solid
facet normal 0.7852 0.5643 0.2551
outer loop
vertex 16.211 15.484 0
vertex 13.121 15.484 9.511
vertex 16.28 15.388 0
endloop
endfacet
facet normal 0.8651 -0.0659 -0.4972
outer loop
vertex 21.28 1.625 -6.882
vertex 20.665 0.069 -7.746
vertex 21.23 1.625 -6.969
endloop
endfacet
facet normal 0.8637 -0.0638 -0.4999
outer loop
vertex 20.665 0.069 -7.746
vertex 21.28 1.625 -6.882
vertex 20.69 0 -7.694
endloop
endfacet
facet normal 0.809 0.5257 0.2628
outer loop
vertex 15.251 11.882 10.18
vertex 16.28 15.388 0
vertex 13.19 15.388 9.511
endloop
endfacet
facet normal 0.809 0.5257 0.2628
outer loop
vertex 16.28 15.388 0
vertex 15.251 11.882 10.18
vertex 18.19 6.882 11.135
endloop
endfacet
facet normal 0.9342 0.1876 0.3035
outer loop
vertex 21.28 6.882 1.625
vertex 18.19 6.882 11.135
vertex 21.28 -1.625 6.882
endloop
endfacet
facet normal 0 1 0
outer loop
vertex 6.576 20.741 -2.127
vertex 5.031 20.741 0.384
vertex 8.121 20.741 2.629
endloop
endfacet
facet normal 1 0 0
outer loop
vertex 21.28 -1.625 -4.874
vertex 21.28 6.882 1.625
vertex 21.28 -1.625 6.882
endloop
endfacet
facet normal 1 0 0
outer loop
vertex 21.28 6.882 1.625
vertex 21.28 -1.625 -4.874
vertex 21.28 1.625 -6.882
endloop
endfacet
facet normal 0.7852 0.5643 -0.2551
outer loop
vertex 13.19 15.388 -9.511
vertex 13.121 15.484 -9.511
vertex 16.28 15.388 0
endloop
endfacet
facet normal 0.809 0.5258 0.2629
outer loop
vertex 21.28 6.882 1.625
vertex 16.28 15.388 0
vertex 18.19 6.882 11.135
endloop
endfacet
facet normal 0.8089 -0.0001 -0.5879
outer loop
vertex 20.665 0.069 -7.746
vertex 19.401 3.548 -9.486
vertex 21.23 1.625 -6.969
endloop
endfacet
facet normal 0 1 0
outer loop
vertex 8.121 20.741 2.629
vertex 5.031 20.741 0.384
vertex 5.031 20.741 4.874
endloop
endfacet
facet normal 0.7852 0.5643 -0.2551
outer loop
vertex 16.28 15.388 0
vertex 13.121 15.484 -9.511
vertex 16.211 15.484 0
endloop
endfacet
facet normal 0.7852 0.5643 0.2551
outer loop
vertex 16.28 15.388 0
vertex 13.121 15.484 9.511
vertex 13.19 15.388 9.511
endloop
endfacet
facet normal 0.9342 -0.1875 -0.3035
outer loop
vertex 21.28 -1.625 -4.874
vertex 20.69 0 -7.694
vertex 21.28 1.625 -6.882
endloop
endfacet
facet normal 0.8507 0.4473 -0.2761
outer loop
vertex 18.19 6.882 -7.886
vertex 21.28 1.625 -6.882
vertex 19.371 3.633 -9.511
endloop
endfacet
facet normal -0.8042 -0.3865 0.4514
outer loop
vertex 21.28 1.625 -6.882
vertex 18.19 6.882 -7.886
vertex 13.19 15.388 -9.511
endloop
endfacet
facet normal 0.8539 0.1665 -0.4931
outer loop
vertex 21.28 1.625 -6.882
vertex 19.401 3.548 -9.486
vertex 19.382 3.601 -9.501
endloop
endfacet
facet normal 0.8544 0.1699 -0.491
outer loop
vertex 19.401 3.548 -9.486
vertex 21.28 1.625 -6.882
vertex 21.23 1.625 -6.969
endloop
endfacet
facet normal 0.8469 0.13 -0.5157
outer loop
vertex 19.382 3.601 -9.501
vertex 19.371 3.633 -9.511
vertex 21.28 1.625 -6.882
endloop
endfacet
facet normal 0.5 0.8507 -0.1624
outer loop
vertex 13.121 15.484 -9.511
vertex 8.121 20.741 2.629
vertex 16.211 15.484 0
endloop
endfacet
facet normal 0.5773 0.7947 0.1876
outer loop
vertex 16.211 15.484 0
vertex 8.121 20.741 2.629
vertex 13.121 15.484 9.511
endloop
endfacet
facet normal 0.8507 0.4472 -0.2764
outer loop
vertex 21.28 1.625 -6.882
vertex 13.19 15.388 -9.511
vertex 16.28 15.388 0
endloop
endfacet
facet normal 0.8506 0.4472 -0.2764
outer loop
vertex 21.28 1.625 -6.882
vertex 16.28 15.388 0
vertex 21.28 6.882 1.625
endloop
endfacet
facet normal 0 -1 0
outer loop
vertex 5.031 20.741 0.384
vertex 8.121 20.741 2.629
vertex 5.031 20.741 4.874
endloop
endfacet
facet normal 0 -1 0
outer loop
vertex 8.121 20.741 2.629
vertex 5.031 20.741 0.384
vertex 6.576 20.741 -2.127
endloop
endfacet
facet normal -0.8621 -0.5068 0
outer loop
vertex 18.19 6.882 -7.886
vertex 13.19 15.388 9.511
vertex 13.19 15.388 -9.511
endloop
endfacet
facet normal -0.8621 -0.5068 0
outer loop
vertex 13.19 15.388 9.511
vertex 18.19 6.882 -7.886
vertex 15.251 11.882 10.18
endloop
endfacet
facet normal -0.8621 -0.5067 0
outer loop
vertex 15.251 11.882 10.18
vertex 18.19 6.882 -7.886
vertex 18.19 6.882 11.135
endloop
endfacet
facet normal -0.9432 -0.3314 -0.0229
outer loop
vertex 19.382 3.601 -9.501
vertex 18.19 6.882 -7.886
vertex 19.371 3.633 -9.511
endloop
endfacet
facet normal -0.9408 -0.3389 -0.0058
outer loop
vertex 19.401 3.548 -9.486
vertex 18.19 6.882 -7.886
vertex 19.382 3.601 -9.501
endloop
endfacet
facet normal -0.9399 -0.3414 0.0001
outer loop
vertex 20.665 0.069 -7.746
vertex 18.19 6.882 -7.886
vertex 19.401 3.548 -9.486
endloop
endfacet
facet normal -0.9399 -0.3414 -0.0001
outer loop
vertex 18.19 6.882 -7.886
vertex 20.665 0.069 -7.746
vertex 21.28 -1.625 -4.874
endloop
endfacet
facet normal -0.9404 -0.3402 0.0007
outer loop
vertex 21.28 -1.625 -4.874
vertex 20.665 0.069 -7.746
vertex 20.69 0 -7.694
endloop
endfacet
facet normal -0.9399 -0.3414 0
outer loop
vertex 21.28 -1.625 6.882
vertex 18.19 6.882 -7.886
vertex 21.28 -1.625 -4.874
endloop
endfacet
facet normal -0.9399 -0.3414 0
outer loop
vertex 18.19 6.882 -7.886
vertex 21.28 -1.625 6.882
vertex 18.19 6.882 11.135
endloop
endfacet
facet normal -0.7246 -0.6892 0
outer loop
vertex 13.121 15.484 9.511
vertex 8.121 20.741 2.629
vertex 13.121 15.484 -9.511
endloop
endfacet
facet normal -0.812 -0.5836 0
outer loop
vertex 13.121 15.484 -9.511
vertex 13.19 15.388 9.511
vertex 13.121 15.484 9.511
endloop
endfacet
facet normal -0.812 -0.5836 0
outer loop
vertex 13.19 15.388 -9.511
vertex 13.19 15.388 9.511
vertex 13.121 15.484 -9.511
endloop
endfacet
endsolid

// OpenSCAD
// Auto-generated OpenSCAD file

    inner_points = 10*[[1.30901696039044, -1.5388417782265715, 0.9510565474746461], [-2.1180339733846583, 0.6881910044632044, -0.16245986108672694], [1.8090169796137625, -0.6881909777335578, 1.1135163775781873], [-1.6180339541613356, 1.5388418049562185, -3.0983185683730596e-08], [1.6180339541612156, -1.538841804956286, 3.0983185683730596e-08], [-1.8090169796138824, 0.68819097773349, -1.1135163775781873], [2.1180339733845384, -0.6881910044632721, 0.16245986108672694], [-1.30901696039056, 1.538841778226504, -0.9510565474746461], [-0.5000000141570125, -0.6881909060497494, 2.064572895340174], [-1.3090169968820657, -0.16245978121444532, 1.801707328858261], [5.066310430925828e-09, 0.1624598944432645, 2.227032725443715], [-0.8090169776587427, 0.6881910192785686, 1.9641671589618024], [0.809016977658623, -0.6881910192786364, -1.9641671589618024], [-5.066430170716978e-09, -0.16245989444333217, -2.227032725443715], [1.3090169968819458, 0.16245978121437765, -1.801707328858261], [0.5000000141568928, 0.6881909060496817, -2.064572895340174], [-1.618034023338573, -1.5388417322190338, 3.303893986172923e-08], [0.5000000468426242, 2.0645728837839843, 0.6881909169706076], [-1.3090170295677974, -1.538841758948748, -0.9510564834525206], [0.8090170406134, 2.06457285705427, -0.26286559952085276], [-2.118033992838755, -0.16245981482511987, -0.6881909555105802], [-0.8090169481364942, 2.064572893422896, -0.26286559849297564], [0.49999998584298705, -0.6881909285267964, 2.0645728947049107], [-1.6180339724070885, 0.6881910252357436, 1.376381907183268], [1.6180339724069686, -0.6881910252358113, -1.376381907183268], [-0.49999998584310684, 0.6881909285267287, -2.0645728947049107], [-1.3090170283594544, -1.5388417193808985, 0.9510565491377863], [0.5000000355661287, 1.5388417893601316, 1.5388417362589322], [-0.5000000355662484, -1.538841789360199, -1.5388417362589322], [1.3090170283593345, 1.538841719380831, -0.9510565491377863], [0.4999999663888912, -1.5388417478151206, 1.5388418002810578], [-2.118033984661154, 0.16245991003935126, 0.6881909582015976], [1.3090169918678283, -0.16245984006011832, 1.8017073271951207], [-1.309016959182217, 1.5388418177943537, 0.9510564851156607], [1.309016959182097, -1.5388418177944212, -0.9510564851156607], [-1.3090169918679482, 0.16245984006005065, -1.8017073271951207], [2.118033984661034, -0.16245991003941893, -0.6881909582015976], [-0.499999966389011, 1.5388417478150531, -1.5388418002810578], [-0.5000000336111086, -1.5388417253380735, 1.5388418009163205], [-1.8090170091361313, -0.6881908964108379, 1.1135163798765904], [0.8090170110911518, 0.6881909829099426, 1.9641671579339253], [-0.49999996443387096, 1.5388418118371785, 1.5388417368941951], [0.49999996443375117, -1.538841811837246, -1.5388417368941951], [-0.8090170110912714, -0.6881909829100104, -1.9641671579339253], [1.8090170091360114, 0.6881908964107701, -1.1135163798765904], [0.5000000336109889, 1.538841725338006, -1.5388418009163205], [-2.1180340041152497, -0.688190909248973, 0.16245986377774424], [-0.49999995315737555, 2.064572906261031, 0.6881909176058706], [-1.6180340050928197, -0.6881909524985592, -1.3763819051275137], [4.586505433710224e-08, 2.064572863011445, -0.8506508512993872]];

    outer_points = 10*[[-0.8090170110916863, -0.6881908812857832, 1.9641671935400922], [1.3090170295679837, 1.538841709741917, -0.95105656307045], [-0.5000000355665741, -1.538841709741917, 1.5388418158770538], [1.6180340050930957, 0.6881908812857832, -1.3763819407334883], [-1.6180340050930957, -0.6881908812857832, 1.3763819407334883], [0.5000000355665741, 1.538841709741917, -1.5388418158770538], [-1.3090170295679837, -1.538841709741917, 0.95105656307045], [0.8090170110916863, 0.6881908812857832, -1.9641671935400922], [1.3090169968815815, 0.1624598744330541, 1.8017073204530507], [1.809017009135817, 0.6881909540230795, 1.113516344270661], [1.6180339724066932, -0.6881909540230795, 1.3763819427900126], [2.118033984660929, -0.1624598744330541, 0.6881909666076228], [-2.118033984660929, 0.1624598744330541, -0.6881909666076228], [-1.6180339724066932, 0.6881909540230795, -1.3763819427900126], [-1.809017009135817, -0.6881909540230795, -1.113516344270661], [-1.3090169968815815, -0.1624598744330541, -1.8017073204530507], [4.5864941067286225e-08, 2.06457290702336, 0.8506507444803071], [1.309016960390704, -1.5388418274333344, -0.9510564678560931], [-0.8090169481364684, 2.06457290702336, 0.26286549167370316], [0.4999999663892946, -1.5388418274333344, -1.538841720662697], [0.5000000468428755, 2.064572848177651, -0.6881910237895683], [1.3090169918683128, -0.16245993327876307, -1.8017073187892874], [0.8090169776582082, -0.6881909176544313, 1.9641671945683543], [2.118034004115161, 0.6881909176544313, 0.1624598281718883], [-2.118034004115161, -0.6881909176544313, -0.1624598281718883], [-0.8090169776582082, 0.6881909176544313, -1.9641671945683543], [0.5000000336107052, 1.5388418049562738, 1.538841721298198], [1.6180339541612545, -1.5388418049562738, 4.863544078581583e-08], [-1.6180339541612545, 1.5388418049562738, -4.863544078581583e-08], [-0.5000000336107052, -1.5388418049562738, -1.538841721298198], [-5.066900010675113e-09, -0.16245977921869703, 2.227032733849236], [1.6180340233385344, 1.5388417322189776, -4.657891639059386e-08], [0.4999999644334254, -1.5388417322189776, 1.538841816512555], [2.1180339928388596, 0.16245977921869703, -0.6881909639155974], [-2.1180339928388596, -0.16245977921869703, 0.6881909639155974], [-0.4999999644334254, 1.5388417322189776, -1.538841816512555], [-1.6180340233385344, -1.5388417322189776, 4.657891639059386e-08], [5.066900010675113e-09, 0.16245977921869703, -2.227032733849236], [0.5000000141564732, 0.6881910128687885, 2.0645728597339326], [1.3090170283591904, 1.5388417685876257, 0.9510564695198562], [1.3090169591819105, -1.5388417685876257, 0.9510565647342133], [2.1180339733846276, -0.6881910128687885, -0.16245982547986293], [-2.1180339733846276, 0.6881910128687885, 0.16245982547986293], [-1.3090169591819105, 1.5388417685876257, -0.9510565647342133], [-1.3090170283591904, -1.5388417685876257, -0.9510564695198562], [-0.5000000141564732, -0.6881910128687885, -2.0645728597339326], [0.8090170406134262, 2.064572870654712, 0.26286549270196535], [1.8090169796140771, -0.6881910353458492, -1.1135163419713967], [-0.4999999531571243, 2.064572870654712, -0.6881910244250694], [0.4999999858435267, -0.6881910353458492, -2.0645728590984316]];

    // Convex hull for inner set (I)
    module inner_hull() {
        hull() {
            for (p = inner_points) {
                translate(p) sphere(r=0.1);
            }
        }
    }

    // Convex hull for outer set (O) minus inner hull (O \ I)
    module outer_minus_inner() {
        difference() {
            hull() {
                for (p = outer_points) {
                    translate(p) sphere(r=0.1);
                }
            }
            inner_hull(); // Subtract inner hull
        }
    }

    // Convex hull for outer set (O) minus all translated inner hulls
    module outer_minus_AllTranslationInner() {
        difference() {
            hull() {
                for (p = outer_points) {
                    translate(p) sphere(r=0.1);
                }
            }
            hull() {
                translate([0,0,50]) inner_hull();
                translate([0,0,-50]) inner_hull();
            }; // Subtract translated inner hulls
        }
    }

    // Difference between outer_minus_inner and outer_minus_AllTranslationInner
    module outer_minus_inner_diff() {
        difference() {
            // Outer minus inner
            difference() {
                hull() {
                    for (p = outer_points) {
                        translate(p) sphere(r=0.1);
                    }
                }
                inner_hull();
            }

            // Subtract Outer minus AllTranslationInner
            difference() {
                hull() {
                    for (p = outer_points) {
                        translate(p) sphere(r=0.1);
                    }
                }
                hull() {
                    translate([0,0,50]) inner_hull();
                    translate([0,0,-50]) inner_hull();
                };
            }
        }
    }

    // Rendering all with colors applied
    color([0, 1, 0, 1]) outer_minus_AllTranslationInner(); // Opaque green
    
